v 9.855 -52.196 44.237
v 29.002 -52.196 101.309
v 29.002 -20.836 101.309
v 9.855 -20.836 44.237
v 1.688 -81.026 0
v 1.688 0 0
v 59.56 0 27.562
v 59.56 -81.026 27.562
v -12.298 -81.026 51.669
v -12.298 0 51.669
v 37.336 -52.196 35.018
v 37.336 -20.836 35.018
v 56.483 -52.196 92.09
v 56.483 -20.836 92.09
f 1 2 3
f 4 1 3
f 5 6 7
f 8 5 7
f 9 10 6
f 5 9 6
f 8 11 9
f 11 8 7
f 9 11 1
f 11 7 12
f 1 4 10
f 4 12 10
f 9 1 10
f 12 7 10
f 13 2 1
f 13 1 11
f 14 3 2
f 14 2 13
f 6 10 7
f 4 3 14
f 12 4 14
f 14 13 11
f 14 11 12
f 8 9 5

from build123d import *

# Parameters (mm, degrees)
F1_DEPTH = 81.026
F2_W     = 28.9863510989
F2_H     = 31.3605703413
F3_DEPTH = 60.198


with BuildPart() as f1:
    # F0 (on Front) → F1 (new body)
    with BuildSketch(Plane.XZ):
        Polygon((-12.2977383435, 51.6691952944), (1.6879233299, 0), (59.5596246421, 27.5620631874), align=None)
    extrude(amount=F1_DEPTH)

    # F2 (on face) → F3 (join)
    with BuildSketch(Plane(origin=(14.3365736593, 0, 42.733759156), x_dir=(0.9480692853, 0, -0.3180638776), z_dir=(0.3180638776, 0, 0.9480692853))):
        with Locations((9.7663637716, -36.5160163492)):
            Rectangle(F2_W, F2_H)
    extrude(amount=F3_DEPTH)


solid = f1.part
